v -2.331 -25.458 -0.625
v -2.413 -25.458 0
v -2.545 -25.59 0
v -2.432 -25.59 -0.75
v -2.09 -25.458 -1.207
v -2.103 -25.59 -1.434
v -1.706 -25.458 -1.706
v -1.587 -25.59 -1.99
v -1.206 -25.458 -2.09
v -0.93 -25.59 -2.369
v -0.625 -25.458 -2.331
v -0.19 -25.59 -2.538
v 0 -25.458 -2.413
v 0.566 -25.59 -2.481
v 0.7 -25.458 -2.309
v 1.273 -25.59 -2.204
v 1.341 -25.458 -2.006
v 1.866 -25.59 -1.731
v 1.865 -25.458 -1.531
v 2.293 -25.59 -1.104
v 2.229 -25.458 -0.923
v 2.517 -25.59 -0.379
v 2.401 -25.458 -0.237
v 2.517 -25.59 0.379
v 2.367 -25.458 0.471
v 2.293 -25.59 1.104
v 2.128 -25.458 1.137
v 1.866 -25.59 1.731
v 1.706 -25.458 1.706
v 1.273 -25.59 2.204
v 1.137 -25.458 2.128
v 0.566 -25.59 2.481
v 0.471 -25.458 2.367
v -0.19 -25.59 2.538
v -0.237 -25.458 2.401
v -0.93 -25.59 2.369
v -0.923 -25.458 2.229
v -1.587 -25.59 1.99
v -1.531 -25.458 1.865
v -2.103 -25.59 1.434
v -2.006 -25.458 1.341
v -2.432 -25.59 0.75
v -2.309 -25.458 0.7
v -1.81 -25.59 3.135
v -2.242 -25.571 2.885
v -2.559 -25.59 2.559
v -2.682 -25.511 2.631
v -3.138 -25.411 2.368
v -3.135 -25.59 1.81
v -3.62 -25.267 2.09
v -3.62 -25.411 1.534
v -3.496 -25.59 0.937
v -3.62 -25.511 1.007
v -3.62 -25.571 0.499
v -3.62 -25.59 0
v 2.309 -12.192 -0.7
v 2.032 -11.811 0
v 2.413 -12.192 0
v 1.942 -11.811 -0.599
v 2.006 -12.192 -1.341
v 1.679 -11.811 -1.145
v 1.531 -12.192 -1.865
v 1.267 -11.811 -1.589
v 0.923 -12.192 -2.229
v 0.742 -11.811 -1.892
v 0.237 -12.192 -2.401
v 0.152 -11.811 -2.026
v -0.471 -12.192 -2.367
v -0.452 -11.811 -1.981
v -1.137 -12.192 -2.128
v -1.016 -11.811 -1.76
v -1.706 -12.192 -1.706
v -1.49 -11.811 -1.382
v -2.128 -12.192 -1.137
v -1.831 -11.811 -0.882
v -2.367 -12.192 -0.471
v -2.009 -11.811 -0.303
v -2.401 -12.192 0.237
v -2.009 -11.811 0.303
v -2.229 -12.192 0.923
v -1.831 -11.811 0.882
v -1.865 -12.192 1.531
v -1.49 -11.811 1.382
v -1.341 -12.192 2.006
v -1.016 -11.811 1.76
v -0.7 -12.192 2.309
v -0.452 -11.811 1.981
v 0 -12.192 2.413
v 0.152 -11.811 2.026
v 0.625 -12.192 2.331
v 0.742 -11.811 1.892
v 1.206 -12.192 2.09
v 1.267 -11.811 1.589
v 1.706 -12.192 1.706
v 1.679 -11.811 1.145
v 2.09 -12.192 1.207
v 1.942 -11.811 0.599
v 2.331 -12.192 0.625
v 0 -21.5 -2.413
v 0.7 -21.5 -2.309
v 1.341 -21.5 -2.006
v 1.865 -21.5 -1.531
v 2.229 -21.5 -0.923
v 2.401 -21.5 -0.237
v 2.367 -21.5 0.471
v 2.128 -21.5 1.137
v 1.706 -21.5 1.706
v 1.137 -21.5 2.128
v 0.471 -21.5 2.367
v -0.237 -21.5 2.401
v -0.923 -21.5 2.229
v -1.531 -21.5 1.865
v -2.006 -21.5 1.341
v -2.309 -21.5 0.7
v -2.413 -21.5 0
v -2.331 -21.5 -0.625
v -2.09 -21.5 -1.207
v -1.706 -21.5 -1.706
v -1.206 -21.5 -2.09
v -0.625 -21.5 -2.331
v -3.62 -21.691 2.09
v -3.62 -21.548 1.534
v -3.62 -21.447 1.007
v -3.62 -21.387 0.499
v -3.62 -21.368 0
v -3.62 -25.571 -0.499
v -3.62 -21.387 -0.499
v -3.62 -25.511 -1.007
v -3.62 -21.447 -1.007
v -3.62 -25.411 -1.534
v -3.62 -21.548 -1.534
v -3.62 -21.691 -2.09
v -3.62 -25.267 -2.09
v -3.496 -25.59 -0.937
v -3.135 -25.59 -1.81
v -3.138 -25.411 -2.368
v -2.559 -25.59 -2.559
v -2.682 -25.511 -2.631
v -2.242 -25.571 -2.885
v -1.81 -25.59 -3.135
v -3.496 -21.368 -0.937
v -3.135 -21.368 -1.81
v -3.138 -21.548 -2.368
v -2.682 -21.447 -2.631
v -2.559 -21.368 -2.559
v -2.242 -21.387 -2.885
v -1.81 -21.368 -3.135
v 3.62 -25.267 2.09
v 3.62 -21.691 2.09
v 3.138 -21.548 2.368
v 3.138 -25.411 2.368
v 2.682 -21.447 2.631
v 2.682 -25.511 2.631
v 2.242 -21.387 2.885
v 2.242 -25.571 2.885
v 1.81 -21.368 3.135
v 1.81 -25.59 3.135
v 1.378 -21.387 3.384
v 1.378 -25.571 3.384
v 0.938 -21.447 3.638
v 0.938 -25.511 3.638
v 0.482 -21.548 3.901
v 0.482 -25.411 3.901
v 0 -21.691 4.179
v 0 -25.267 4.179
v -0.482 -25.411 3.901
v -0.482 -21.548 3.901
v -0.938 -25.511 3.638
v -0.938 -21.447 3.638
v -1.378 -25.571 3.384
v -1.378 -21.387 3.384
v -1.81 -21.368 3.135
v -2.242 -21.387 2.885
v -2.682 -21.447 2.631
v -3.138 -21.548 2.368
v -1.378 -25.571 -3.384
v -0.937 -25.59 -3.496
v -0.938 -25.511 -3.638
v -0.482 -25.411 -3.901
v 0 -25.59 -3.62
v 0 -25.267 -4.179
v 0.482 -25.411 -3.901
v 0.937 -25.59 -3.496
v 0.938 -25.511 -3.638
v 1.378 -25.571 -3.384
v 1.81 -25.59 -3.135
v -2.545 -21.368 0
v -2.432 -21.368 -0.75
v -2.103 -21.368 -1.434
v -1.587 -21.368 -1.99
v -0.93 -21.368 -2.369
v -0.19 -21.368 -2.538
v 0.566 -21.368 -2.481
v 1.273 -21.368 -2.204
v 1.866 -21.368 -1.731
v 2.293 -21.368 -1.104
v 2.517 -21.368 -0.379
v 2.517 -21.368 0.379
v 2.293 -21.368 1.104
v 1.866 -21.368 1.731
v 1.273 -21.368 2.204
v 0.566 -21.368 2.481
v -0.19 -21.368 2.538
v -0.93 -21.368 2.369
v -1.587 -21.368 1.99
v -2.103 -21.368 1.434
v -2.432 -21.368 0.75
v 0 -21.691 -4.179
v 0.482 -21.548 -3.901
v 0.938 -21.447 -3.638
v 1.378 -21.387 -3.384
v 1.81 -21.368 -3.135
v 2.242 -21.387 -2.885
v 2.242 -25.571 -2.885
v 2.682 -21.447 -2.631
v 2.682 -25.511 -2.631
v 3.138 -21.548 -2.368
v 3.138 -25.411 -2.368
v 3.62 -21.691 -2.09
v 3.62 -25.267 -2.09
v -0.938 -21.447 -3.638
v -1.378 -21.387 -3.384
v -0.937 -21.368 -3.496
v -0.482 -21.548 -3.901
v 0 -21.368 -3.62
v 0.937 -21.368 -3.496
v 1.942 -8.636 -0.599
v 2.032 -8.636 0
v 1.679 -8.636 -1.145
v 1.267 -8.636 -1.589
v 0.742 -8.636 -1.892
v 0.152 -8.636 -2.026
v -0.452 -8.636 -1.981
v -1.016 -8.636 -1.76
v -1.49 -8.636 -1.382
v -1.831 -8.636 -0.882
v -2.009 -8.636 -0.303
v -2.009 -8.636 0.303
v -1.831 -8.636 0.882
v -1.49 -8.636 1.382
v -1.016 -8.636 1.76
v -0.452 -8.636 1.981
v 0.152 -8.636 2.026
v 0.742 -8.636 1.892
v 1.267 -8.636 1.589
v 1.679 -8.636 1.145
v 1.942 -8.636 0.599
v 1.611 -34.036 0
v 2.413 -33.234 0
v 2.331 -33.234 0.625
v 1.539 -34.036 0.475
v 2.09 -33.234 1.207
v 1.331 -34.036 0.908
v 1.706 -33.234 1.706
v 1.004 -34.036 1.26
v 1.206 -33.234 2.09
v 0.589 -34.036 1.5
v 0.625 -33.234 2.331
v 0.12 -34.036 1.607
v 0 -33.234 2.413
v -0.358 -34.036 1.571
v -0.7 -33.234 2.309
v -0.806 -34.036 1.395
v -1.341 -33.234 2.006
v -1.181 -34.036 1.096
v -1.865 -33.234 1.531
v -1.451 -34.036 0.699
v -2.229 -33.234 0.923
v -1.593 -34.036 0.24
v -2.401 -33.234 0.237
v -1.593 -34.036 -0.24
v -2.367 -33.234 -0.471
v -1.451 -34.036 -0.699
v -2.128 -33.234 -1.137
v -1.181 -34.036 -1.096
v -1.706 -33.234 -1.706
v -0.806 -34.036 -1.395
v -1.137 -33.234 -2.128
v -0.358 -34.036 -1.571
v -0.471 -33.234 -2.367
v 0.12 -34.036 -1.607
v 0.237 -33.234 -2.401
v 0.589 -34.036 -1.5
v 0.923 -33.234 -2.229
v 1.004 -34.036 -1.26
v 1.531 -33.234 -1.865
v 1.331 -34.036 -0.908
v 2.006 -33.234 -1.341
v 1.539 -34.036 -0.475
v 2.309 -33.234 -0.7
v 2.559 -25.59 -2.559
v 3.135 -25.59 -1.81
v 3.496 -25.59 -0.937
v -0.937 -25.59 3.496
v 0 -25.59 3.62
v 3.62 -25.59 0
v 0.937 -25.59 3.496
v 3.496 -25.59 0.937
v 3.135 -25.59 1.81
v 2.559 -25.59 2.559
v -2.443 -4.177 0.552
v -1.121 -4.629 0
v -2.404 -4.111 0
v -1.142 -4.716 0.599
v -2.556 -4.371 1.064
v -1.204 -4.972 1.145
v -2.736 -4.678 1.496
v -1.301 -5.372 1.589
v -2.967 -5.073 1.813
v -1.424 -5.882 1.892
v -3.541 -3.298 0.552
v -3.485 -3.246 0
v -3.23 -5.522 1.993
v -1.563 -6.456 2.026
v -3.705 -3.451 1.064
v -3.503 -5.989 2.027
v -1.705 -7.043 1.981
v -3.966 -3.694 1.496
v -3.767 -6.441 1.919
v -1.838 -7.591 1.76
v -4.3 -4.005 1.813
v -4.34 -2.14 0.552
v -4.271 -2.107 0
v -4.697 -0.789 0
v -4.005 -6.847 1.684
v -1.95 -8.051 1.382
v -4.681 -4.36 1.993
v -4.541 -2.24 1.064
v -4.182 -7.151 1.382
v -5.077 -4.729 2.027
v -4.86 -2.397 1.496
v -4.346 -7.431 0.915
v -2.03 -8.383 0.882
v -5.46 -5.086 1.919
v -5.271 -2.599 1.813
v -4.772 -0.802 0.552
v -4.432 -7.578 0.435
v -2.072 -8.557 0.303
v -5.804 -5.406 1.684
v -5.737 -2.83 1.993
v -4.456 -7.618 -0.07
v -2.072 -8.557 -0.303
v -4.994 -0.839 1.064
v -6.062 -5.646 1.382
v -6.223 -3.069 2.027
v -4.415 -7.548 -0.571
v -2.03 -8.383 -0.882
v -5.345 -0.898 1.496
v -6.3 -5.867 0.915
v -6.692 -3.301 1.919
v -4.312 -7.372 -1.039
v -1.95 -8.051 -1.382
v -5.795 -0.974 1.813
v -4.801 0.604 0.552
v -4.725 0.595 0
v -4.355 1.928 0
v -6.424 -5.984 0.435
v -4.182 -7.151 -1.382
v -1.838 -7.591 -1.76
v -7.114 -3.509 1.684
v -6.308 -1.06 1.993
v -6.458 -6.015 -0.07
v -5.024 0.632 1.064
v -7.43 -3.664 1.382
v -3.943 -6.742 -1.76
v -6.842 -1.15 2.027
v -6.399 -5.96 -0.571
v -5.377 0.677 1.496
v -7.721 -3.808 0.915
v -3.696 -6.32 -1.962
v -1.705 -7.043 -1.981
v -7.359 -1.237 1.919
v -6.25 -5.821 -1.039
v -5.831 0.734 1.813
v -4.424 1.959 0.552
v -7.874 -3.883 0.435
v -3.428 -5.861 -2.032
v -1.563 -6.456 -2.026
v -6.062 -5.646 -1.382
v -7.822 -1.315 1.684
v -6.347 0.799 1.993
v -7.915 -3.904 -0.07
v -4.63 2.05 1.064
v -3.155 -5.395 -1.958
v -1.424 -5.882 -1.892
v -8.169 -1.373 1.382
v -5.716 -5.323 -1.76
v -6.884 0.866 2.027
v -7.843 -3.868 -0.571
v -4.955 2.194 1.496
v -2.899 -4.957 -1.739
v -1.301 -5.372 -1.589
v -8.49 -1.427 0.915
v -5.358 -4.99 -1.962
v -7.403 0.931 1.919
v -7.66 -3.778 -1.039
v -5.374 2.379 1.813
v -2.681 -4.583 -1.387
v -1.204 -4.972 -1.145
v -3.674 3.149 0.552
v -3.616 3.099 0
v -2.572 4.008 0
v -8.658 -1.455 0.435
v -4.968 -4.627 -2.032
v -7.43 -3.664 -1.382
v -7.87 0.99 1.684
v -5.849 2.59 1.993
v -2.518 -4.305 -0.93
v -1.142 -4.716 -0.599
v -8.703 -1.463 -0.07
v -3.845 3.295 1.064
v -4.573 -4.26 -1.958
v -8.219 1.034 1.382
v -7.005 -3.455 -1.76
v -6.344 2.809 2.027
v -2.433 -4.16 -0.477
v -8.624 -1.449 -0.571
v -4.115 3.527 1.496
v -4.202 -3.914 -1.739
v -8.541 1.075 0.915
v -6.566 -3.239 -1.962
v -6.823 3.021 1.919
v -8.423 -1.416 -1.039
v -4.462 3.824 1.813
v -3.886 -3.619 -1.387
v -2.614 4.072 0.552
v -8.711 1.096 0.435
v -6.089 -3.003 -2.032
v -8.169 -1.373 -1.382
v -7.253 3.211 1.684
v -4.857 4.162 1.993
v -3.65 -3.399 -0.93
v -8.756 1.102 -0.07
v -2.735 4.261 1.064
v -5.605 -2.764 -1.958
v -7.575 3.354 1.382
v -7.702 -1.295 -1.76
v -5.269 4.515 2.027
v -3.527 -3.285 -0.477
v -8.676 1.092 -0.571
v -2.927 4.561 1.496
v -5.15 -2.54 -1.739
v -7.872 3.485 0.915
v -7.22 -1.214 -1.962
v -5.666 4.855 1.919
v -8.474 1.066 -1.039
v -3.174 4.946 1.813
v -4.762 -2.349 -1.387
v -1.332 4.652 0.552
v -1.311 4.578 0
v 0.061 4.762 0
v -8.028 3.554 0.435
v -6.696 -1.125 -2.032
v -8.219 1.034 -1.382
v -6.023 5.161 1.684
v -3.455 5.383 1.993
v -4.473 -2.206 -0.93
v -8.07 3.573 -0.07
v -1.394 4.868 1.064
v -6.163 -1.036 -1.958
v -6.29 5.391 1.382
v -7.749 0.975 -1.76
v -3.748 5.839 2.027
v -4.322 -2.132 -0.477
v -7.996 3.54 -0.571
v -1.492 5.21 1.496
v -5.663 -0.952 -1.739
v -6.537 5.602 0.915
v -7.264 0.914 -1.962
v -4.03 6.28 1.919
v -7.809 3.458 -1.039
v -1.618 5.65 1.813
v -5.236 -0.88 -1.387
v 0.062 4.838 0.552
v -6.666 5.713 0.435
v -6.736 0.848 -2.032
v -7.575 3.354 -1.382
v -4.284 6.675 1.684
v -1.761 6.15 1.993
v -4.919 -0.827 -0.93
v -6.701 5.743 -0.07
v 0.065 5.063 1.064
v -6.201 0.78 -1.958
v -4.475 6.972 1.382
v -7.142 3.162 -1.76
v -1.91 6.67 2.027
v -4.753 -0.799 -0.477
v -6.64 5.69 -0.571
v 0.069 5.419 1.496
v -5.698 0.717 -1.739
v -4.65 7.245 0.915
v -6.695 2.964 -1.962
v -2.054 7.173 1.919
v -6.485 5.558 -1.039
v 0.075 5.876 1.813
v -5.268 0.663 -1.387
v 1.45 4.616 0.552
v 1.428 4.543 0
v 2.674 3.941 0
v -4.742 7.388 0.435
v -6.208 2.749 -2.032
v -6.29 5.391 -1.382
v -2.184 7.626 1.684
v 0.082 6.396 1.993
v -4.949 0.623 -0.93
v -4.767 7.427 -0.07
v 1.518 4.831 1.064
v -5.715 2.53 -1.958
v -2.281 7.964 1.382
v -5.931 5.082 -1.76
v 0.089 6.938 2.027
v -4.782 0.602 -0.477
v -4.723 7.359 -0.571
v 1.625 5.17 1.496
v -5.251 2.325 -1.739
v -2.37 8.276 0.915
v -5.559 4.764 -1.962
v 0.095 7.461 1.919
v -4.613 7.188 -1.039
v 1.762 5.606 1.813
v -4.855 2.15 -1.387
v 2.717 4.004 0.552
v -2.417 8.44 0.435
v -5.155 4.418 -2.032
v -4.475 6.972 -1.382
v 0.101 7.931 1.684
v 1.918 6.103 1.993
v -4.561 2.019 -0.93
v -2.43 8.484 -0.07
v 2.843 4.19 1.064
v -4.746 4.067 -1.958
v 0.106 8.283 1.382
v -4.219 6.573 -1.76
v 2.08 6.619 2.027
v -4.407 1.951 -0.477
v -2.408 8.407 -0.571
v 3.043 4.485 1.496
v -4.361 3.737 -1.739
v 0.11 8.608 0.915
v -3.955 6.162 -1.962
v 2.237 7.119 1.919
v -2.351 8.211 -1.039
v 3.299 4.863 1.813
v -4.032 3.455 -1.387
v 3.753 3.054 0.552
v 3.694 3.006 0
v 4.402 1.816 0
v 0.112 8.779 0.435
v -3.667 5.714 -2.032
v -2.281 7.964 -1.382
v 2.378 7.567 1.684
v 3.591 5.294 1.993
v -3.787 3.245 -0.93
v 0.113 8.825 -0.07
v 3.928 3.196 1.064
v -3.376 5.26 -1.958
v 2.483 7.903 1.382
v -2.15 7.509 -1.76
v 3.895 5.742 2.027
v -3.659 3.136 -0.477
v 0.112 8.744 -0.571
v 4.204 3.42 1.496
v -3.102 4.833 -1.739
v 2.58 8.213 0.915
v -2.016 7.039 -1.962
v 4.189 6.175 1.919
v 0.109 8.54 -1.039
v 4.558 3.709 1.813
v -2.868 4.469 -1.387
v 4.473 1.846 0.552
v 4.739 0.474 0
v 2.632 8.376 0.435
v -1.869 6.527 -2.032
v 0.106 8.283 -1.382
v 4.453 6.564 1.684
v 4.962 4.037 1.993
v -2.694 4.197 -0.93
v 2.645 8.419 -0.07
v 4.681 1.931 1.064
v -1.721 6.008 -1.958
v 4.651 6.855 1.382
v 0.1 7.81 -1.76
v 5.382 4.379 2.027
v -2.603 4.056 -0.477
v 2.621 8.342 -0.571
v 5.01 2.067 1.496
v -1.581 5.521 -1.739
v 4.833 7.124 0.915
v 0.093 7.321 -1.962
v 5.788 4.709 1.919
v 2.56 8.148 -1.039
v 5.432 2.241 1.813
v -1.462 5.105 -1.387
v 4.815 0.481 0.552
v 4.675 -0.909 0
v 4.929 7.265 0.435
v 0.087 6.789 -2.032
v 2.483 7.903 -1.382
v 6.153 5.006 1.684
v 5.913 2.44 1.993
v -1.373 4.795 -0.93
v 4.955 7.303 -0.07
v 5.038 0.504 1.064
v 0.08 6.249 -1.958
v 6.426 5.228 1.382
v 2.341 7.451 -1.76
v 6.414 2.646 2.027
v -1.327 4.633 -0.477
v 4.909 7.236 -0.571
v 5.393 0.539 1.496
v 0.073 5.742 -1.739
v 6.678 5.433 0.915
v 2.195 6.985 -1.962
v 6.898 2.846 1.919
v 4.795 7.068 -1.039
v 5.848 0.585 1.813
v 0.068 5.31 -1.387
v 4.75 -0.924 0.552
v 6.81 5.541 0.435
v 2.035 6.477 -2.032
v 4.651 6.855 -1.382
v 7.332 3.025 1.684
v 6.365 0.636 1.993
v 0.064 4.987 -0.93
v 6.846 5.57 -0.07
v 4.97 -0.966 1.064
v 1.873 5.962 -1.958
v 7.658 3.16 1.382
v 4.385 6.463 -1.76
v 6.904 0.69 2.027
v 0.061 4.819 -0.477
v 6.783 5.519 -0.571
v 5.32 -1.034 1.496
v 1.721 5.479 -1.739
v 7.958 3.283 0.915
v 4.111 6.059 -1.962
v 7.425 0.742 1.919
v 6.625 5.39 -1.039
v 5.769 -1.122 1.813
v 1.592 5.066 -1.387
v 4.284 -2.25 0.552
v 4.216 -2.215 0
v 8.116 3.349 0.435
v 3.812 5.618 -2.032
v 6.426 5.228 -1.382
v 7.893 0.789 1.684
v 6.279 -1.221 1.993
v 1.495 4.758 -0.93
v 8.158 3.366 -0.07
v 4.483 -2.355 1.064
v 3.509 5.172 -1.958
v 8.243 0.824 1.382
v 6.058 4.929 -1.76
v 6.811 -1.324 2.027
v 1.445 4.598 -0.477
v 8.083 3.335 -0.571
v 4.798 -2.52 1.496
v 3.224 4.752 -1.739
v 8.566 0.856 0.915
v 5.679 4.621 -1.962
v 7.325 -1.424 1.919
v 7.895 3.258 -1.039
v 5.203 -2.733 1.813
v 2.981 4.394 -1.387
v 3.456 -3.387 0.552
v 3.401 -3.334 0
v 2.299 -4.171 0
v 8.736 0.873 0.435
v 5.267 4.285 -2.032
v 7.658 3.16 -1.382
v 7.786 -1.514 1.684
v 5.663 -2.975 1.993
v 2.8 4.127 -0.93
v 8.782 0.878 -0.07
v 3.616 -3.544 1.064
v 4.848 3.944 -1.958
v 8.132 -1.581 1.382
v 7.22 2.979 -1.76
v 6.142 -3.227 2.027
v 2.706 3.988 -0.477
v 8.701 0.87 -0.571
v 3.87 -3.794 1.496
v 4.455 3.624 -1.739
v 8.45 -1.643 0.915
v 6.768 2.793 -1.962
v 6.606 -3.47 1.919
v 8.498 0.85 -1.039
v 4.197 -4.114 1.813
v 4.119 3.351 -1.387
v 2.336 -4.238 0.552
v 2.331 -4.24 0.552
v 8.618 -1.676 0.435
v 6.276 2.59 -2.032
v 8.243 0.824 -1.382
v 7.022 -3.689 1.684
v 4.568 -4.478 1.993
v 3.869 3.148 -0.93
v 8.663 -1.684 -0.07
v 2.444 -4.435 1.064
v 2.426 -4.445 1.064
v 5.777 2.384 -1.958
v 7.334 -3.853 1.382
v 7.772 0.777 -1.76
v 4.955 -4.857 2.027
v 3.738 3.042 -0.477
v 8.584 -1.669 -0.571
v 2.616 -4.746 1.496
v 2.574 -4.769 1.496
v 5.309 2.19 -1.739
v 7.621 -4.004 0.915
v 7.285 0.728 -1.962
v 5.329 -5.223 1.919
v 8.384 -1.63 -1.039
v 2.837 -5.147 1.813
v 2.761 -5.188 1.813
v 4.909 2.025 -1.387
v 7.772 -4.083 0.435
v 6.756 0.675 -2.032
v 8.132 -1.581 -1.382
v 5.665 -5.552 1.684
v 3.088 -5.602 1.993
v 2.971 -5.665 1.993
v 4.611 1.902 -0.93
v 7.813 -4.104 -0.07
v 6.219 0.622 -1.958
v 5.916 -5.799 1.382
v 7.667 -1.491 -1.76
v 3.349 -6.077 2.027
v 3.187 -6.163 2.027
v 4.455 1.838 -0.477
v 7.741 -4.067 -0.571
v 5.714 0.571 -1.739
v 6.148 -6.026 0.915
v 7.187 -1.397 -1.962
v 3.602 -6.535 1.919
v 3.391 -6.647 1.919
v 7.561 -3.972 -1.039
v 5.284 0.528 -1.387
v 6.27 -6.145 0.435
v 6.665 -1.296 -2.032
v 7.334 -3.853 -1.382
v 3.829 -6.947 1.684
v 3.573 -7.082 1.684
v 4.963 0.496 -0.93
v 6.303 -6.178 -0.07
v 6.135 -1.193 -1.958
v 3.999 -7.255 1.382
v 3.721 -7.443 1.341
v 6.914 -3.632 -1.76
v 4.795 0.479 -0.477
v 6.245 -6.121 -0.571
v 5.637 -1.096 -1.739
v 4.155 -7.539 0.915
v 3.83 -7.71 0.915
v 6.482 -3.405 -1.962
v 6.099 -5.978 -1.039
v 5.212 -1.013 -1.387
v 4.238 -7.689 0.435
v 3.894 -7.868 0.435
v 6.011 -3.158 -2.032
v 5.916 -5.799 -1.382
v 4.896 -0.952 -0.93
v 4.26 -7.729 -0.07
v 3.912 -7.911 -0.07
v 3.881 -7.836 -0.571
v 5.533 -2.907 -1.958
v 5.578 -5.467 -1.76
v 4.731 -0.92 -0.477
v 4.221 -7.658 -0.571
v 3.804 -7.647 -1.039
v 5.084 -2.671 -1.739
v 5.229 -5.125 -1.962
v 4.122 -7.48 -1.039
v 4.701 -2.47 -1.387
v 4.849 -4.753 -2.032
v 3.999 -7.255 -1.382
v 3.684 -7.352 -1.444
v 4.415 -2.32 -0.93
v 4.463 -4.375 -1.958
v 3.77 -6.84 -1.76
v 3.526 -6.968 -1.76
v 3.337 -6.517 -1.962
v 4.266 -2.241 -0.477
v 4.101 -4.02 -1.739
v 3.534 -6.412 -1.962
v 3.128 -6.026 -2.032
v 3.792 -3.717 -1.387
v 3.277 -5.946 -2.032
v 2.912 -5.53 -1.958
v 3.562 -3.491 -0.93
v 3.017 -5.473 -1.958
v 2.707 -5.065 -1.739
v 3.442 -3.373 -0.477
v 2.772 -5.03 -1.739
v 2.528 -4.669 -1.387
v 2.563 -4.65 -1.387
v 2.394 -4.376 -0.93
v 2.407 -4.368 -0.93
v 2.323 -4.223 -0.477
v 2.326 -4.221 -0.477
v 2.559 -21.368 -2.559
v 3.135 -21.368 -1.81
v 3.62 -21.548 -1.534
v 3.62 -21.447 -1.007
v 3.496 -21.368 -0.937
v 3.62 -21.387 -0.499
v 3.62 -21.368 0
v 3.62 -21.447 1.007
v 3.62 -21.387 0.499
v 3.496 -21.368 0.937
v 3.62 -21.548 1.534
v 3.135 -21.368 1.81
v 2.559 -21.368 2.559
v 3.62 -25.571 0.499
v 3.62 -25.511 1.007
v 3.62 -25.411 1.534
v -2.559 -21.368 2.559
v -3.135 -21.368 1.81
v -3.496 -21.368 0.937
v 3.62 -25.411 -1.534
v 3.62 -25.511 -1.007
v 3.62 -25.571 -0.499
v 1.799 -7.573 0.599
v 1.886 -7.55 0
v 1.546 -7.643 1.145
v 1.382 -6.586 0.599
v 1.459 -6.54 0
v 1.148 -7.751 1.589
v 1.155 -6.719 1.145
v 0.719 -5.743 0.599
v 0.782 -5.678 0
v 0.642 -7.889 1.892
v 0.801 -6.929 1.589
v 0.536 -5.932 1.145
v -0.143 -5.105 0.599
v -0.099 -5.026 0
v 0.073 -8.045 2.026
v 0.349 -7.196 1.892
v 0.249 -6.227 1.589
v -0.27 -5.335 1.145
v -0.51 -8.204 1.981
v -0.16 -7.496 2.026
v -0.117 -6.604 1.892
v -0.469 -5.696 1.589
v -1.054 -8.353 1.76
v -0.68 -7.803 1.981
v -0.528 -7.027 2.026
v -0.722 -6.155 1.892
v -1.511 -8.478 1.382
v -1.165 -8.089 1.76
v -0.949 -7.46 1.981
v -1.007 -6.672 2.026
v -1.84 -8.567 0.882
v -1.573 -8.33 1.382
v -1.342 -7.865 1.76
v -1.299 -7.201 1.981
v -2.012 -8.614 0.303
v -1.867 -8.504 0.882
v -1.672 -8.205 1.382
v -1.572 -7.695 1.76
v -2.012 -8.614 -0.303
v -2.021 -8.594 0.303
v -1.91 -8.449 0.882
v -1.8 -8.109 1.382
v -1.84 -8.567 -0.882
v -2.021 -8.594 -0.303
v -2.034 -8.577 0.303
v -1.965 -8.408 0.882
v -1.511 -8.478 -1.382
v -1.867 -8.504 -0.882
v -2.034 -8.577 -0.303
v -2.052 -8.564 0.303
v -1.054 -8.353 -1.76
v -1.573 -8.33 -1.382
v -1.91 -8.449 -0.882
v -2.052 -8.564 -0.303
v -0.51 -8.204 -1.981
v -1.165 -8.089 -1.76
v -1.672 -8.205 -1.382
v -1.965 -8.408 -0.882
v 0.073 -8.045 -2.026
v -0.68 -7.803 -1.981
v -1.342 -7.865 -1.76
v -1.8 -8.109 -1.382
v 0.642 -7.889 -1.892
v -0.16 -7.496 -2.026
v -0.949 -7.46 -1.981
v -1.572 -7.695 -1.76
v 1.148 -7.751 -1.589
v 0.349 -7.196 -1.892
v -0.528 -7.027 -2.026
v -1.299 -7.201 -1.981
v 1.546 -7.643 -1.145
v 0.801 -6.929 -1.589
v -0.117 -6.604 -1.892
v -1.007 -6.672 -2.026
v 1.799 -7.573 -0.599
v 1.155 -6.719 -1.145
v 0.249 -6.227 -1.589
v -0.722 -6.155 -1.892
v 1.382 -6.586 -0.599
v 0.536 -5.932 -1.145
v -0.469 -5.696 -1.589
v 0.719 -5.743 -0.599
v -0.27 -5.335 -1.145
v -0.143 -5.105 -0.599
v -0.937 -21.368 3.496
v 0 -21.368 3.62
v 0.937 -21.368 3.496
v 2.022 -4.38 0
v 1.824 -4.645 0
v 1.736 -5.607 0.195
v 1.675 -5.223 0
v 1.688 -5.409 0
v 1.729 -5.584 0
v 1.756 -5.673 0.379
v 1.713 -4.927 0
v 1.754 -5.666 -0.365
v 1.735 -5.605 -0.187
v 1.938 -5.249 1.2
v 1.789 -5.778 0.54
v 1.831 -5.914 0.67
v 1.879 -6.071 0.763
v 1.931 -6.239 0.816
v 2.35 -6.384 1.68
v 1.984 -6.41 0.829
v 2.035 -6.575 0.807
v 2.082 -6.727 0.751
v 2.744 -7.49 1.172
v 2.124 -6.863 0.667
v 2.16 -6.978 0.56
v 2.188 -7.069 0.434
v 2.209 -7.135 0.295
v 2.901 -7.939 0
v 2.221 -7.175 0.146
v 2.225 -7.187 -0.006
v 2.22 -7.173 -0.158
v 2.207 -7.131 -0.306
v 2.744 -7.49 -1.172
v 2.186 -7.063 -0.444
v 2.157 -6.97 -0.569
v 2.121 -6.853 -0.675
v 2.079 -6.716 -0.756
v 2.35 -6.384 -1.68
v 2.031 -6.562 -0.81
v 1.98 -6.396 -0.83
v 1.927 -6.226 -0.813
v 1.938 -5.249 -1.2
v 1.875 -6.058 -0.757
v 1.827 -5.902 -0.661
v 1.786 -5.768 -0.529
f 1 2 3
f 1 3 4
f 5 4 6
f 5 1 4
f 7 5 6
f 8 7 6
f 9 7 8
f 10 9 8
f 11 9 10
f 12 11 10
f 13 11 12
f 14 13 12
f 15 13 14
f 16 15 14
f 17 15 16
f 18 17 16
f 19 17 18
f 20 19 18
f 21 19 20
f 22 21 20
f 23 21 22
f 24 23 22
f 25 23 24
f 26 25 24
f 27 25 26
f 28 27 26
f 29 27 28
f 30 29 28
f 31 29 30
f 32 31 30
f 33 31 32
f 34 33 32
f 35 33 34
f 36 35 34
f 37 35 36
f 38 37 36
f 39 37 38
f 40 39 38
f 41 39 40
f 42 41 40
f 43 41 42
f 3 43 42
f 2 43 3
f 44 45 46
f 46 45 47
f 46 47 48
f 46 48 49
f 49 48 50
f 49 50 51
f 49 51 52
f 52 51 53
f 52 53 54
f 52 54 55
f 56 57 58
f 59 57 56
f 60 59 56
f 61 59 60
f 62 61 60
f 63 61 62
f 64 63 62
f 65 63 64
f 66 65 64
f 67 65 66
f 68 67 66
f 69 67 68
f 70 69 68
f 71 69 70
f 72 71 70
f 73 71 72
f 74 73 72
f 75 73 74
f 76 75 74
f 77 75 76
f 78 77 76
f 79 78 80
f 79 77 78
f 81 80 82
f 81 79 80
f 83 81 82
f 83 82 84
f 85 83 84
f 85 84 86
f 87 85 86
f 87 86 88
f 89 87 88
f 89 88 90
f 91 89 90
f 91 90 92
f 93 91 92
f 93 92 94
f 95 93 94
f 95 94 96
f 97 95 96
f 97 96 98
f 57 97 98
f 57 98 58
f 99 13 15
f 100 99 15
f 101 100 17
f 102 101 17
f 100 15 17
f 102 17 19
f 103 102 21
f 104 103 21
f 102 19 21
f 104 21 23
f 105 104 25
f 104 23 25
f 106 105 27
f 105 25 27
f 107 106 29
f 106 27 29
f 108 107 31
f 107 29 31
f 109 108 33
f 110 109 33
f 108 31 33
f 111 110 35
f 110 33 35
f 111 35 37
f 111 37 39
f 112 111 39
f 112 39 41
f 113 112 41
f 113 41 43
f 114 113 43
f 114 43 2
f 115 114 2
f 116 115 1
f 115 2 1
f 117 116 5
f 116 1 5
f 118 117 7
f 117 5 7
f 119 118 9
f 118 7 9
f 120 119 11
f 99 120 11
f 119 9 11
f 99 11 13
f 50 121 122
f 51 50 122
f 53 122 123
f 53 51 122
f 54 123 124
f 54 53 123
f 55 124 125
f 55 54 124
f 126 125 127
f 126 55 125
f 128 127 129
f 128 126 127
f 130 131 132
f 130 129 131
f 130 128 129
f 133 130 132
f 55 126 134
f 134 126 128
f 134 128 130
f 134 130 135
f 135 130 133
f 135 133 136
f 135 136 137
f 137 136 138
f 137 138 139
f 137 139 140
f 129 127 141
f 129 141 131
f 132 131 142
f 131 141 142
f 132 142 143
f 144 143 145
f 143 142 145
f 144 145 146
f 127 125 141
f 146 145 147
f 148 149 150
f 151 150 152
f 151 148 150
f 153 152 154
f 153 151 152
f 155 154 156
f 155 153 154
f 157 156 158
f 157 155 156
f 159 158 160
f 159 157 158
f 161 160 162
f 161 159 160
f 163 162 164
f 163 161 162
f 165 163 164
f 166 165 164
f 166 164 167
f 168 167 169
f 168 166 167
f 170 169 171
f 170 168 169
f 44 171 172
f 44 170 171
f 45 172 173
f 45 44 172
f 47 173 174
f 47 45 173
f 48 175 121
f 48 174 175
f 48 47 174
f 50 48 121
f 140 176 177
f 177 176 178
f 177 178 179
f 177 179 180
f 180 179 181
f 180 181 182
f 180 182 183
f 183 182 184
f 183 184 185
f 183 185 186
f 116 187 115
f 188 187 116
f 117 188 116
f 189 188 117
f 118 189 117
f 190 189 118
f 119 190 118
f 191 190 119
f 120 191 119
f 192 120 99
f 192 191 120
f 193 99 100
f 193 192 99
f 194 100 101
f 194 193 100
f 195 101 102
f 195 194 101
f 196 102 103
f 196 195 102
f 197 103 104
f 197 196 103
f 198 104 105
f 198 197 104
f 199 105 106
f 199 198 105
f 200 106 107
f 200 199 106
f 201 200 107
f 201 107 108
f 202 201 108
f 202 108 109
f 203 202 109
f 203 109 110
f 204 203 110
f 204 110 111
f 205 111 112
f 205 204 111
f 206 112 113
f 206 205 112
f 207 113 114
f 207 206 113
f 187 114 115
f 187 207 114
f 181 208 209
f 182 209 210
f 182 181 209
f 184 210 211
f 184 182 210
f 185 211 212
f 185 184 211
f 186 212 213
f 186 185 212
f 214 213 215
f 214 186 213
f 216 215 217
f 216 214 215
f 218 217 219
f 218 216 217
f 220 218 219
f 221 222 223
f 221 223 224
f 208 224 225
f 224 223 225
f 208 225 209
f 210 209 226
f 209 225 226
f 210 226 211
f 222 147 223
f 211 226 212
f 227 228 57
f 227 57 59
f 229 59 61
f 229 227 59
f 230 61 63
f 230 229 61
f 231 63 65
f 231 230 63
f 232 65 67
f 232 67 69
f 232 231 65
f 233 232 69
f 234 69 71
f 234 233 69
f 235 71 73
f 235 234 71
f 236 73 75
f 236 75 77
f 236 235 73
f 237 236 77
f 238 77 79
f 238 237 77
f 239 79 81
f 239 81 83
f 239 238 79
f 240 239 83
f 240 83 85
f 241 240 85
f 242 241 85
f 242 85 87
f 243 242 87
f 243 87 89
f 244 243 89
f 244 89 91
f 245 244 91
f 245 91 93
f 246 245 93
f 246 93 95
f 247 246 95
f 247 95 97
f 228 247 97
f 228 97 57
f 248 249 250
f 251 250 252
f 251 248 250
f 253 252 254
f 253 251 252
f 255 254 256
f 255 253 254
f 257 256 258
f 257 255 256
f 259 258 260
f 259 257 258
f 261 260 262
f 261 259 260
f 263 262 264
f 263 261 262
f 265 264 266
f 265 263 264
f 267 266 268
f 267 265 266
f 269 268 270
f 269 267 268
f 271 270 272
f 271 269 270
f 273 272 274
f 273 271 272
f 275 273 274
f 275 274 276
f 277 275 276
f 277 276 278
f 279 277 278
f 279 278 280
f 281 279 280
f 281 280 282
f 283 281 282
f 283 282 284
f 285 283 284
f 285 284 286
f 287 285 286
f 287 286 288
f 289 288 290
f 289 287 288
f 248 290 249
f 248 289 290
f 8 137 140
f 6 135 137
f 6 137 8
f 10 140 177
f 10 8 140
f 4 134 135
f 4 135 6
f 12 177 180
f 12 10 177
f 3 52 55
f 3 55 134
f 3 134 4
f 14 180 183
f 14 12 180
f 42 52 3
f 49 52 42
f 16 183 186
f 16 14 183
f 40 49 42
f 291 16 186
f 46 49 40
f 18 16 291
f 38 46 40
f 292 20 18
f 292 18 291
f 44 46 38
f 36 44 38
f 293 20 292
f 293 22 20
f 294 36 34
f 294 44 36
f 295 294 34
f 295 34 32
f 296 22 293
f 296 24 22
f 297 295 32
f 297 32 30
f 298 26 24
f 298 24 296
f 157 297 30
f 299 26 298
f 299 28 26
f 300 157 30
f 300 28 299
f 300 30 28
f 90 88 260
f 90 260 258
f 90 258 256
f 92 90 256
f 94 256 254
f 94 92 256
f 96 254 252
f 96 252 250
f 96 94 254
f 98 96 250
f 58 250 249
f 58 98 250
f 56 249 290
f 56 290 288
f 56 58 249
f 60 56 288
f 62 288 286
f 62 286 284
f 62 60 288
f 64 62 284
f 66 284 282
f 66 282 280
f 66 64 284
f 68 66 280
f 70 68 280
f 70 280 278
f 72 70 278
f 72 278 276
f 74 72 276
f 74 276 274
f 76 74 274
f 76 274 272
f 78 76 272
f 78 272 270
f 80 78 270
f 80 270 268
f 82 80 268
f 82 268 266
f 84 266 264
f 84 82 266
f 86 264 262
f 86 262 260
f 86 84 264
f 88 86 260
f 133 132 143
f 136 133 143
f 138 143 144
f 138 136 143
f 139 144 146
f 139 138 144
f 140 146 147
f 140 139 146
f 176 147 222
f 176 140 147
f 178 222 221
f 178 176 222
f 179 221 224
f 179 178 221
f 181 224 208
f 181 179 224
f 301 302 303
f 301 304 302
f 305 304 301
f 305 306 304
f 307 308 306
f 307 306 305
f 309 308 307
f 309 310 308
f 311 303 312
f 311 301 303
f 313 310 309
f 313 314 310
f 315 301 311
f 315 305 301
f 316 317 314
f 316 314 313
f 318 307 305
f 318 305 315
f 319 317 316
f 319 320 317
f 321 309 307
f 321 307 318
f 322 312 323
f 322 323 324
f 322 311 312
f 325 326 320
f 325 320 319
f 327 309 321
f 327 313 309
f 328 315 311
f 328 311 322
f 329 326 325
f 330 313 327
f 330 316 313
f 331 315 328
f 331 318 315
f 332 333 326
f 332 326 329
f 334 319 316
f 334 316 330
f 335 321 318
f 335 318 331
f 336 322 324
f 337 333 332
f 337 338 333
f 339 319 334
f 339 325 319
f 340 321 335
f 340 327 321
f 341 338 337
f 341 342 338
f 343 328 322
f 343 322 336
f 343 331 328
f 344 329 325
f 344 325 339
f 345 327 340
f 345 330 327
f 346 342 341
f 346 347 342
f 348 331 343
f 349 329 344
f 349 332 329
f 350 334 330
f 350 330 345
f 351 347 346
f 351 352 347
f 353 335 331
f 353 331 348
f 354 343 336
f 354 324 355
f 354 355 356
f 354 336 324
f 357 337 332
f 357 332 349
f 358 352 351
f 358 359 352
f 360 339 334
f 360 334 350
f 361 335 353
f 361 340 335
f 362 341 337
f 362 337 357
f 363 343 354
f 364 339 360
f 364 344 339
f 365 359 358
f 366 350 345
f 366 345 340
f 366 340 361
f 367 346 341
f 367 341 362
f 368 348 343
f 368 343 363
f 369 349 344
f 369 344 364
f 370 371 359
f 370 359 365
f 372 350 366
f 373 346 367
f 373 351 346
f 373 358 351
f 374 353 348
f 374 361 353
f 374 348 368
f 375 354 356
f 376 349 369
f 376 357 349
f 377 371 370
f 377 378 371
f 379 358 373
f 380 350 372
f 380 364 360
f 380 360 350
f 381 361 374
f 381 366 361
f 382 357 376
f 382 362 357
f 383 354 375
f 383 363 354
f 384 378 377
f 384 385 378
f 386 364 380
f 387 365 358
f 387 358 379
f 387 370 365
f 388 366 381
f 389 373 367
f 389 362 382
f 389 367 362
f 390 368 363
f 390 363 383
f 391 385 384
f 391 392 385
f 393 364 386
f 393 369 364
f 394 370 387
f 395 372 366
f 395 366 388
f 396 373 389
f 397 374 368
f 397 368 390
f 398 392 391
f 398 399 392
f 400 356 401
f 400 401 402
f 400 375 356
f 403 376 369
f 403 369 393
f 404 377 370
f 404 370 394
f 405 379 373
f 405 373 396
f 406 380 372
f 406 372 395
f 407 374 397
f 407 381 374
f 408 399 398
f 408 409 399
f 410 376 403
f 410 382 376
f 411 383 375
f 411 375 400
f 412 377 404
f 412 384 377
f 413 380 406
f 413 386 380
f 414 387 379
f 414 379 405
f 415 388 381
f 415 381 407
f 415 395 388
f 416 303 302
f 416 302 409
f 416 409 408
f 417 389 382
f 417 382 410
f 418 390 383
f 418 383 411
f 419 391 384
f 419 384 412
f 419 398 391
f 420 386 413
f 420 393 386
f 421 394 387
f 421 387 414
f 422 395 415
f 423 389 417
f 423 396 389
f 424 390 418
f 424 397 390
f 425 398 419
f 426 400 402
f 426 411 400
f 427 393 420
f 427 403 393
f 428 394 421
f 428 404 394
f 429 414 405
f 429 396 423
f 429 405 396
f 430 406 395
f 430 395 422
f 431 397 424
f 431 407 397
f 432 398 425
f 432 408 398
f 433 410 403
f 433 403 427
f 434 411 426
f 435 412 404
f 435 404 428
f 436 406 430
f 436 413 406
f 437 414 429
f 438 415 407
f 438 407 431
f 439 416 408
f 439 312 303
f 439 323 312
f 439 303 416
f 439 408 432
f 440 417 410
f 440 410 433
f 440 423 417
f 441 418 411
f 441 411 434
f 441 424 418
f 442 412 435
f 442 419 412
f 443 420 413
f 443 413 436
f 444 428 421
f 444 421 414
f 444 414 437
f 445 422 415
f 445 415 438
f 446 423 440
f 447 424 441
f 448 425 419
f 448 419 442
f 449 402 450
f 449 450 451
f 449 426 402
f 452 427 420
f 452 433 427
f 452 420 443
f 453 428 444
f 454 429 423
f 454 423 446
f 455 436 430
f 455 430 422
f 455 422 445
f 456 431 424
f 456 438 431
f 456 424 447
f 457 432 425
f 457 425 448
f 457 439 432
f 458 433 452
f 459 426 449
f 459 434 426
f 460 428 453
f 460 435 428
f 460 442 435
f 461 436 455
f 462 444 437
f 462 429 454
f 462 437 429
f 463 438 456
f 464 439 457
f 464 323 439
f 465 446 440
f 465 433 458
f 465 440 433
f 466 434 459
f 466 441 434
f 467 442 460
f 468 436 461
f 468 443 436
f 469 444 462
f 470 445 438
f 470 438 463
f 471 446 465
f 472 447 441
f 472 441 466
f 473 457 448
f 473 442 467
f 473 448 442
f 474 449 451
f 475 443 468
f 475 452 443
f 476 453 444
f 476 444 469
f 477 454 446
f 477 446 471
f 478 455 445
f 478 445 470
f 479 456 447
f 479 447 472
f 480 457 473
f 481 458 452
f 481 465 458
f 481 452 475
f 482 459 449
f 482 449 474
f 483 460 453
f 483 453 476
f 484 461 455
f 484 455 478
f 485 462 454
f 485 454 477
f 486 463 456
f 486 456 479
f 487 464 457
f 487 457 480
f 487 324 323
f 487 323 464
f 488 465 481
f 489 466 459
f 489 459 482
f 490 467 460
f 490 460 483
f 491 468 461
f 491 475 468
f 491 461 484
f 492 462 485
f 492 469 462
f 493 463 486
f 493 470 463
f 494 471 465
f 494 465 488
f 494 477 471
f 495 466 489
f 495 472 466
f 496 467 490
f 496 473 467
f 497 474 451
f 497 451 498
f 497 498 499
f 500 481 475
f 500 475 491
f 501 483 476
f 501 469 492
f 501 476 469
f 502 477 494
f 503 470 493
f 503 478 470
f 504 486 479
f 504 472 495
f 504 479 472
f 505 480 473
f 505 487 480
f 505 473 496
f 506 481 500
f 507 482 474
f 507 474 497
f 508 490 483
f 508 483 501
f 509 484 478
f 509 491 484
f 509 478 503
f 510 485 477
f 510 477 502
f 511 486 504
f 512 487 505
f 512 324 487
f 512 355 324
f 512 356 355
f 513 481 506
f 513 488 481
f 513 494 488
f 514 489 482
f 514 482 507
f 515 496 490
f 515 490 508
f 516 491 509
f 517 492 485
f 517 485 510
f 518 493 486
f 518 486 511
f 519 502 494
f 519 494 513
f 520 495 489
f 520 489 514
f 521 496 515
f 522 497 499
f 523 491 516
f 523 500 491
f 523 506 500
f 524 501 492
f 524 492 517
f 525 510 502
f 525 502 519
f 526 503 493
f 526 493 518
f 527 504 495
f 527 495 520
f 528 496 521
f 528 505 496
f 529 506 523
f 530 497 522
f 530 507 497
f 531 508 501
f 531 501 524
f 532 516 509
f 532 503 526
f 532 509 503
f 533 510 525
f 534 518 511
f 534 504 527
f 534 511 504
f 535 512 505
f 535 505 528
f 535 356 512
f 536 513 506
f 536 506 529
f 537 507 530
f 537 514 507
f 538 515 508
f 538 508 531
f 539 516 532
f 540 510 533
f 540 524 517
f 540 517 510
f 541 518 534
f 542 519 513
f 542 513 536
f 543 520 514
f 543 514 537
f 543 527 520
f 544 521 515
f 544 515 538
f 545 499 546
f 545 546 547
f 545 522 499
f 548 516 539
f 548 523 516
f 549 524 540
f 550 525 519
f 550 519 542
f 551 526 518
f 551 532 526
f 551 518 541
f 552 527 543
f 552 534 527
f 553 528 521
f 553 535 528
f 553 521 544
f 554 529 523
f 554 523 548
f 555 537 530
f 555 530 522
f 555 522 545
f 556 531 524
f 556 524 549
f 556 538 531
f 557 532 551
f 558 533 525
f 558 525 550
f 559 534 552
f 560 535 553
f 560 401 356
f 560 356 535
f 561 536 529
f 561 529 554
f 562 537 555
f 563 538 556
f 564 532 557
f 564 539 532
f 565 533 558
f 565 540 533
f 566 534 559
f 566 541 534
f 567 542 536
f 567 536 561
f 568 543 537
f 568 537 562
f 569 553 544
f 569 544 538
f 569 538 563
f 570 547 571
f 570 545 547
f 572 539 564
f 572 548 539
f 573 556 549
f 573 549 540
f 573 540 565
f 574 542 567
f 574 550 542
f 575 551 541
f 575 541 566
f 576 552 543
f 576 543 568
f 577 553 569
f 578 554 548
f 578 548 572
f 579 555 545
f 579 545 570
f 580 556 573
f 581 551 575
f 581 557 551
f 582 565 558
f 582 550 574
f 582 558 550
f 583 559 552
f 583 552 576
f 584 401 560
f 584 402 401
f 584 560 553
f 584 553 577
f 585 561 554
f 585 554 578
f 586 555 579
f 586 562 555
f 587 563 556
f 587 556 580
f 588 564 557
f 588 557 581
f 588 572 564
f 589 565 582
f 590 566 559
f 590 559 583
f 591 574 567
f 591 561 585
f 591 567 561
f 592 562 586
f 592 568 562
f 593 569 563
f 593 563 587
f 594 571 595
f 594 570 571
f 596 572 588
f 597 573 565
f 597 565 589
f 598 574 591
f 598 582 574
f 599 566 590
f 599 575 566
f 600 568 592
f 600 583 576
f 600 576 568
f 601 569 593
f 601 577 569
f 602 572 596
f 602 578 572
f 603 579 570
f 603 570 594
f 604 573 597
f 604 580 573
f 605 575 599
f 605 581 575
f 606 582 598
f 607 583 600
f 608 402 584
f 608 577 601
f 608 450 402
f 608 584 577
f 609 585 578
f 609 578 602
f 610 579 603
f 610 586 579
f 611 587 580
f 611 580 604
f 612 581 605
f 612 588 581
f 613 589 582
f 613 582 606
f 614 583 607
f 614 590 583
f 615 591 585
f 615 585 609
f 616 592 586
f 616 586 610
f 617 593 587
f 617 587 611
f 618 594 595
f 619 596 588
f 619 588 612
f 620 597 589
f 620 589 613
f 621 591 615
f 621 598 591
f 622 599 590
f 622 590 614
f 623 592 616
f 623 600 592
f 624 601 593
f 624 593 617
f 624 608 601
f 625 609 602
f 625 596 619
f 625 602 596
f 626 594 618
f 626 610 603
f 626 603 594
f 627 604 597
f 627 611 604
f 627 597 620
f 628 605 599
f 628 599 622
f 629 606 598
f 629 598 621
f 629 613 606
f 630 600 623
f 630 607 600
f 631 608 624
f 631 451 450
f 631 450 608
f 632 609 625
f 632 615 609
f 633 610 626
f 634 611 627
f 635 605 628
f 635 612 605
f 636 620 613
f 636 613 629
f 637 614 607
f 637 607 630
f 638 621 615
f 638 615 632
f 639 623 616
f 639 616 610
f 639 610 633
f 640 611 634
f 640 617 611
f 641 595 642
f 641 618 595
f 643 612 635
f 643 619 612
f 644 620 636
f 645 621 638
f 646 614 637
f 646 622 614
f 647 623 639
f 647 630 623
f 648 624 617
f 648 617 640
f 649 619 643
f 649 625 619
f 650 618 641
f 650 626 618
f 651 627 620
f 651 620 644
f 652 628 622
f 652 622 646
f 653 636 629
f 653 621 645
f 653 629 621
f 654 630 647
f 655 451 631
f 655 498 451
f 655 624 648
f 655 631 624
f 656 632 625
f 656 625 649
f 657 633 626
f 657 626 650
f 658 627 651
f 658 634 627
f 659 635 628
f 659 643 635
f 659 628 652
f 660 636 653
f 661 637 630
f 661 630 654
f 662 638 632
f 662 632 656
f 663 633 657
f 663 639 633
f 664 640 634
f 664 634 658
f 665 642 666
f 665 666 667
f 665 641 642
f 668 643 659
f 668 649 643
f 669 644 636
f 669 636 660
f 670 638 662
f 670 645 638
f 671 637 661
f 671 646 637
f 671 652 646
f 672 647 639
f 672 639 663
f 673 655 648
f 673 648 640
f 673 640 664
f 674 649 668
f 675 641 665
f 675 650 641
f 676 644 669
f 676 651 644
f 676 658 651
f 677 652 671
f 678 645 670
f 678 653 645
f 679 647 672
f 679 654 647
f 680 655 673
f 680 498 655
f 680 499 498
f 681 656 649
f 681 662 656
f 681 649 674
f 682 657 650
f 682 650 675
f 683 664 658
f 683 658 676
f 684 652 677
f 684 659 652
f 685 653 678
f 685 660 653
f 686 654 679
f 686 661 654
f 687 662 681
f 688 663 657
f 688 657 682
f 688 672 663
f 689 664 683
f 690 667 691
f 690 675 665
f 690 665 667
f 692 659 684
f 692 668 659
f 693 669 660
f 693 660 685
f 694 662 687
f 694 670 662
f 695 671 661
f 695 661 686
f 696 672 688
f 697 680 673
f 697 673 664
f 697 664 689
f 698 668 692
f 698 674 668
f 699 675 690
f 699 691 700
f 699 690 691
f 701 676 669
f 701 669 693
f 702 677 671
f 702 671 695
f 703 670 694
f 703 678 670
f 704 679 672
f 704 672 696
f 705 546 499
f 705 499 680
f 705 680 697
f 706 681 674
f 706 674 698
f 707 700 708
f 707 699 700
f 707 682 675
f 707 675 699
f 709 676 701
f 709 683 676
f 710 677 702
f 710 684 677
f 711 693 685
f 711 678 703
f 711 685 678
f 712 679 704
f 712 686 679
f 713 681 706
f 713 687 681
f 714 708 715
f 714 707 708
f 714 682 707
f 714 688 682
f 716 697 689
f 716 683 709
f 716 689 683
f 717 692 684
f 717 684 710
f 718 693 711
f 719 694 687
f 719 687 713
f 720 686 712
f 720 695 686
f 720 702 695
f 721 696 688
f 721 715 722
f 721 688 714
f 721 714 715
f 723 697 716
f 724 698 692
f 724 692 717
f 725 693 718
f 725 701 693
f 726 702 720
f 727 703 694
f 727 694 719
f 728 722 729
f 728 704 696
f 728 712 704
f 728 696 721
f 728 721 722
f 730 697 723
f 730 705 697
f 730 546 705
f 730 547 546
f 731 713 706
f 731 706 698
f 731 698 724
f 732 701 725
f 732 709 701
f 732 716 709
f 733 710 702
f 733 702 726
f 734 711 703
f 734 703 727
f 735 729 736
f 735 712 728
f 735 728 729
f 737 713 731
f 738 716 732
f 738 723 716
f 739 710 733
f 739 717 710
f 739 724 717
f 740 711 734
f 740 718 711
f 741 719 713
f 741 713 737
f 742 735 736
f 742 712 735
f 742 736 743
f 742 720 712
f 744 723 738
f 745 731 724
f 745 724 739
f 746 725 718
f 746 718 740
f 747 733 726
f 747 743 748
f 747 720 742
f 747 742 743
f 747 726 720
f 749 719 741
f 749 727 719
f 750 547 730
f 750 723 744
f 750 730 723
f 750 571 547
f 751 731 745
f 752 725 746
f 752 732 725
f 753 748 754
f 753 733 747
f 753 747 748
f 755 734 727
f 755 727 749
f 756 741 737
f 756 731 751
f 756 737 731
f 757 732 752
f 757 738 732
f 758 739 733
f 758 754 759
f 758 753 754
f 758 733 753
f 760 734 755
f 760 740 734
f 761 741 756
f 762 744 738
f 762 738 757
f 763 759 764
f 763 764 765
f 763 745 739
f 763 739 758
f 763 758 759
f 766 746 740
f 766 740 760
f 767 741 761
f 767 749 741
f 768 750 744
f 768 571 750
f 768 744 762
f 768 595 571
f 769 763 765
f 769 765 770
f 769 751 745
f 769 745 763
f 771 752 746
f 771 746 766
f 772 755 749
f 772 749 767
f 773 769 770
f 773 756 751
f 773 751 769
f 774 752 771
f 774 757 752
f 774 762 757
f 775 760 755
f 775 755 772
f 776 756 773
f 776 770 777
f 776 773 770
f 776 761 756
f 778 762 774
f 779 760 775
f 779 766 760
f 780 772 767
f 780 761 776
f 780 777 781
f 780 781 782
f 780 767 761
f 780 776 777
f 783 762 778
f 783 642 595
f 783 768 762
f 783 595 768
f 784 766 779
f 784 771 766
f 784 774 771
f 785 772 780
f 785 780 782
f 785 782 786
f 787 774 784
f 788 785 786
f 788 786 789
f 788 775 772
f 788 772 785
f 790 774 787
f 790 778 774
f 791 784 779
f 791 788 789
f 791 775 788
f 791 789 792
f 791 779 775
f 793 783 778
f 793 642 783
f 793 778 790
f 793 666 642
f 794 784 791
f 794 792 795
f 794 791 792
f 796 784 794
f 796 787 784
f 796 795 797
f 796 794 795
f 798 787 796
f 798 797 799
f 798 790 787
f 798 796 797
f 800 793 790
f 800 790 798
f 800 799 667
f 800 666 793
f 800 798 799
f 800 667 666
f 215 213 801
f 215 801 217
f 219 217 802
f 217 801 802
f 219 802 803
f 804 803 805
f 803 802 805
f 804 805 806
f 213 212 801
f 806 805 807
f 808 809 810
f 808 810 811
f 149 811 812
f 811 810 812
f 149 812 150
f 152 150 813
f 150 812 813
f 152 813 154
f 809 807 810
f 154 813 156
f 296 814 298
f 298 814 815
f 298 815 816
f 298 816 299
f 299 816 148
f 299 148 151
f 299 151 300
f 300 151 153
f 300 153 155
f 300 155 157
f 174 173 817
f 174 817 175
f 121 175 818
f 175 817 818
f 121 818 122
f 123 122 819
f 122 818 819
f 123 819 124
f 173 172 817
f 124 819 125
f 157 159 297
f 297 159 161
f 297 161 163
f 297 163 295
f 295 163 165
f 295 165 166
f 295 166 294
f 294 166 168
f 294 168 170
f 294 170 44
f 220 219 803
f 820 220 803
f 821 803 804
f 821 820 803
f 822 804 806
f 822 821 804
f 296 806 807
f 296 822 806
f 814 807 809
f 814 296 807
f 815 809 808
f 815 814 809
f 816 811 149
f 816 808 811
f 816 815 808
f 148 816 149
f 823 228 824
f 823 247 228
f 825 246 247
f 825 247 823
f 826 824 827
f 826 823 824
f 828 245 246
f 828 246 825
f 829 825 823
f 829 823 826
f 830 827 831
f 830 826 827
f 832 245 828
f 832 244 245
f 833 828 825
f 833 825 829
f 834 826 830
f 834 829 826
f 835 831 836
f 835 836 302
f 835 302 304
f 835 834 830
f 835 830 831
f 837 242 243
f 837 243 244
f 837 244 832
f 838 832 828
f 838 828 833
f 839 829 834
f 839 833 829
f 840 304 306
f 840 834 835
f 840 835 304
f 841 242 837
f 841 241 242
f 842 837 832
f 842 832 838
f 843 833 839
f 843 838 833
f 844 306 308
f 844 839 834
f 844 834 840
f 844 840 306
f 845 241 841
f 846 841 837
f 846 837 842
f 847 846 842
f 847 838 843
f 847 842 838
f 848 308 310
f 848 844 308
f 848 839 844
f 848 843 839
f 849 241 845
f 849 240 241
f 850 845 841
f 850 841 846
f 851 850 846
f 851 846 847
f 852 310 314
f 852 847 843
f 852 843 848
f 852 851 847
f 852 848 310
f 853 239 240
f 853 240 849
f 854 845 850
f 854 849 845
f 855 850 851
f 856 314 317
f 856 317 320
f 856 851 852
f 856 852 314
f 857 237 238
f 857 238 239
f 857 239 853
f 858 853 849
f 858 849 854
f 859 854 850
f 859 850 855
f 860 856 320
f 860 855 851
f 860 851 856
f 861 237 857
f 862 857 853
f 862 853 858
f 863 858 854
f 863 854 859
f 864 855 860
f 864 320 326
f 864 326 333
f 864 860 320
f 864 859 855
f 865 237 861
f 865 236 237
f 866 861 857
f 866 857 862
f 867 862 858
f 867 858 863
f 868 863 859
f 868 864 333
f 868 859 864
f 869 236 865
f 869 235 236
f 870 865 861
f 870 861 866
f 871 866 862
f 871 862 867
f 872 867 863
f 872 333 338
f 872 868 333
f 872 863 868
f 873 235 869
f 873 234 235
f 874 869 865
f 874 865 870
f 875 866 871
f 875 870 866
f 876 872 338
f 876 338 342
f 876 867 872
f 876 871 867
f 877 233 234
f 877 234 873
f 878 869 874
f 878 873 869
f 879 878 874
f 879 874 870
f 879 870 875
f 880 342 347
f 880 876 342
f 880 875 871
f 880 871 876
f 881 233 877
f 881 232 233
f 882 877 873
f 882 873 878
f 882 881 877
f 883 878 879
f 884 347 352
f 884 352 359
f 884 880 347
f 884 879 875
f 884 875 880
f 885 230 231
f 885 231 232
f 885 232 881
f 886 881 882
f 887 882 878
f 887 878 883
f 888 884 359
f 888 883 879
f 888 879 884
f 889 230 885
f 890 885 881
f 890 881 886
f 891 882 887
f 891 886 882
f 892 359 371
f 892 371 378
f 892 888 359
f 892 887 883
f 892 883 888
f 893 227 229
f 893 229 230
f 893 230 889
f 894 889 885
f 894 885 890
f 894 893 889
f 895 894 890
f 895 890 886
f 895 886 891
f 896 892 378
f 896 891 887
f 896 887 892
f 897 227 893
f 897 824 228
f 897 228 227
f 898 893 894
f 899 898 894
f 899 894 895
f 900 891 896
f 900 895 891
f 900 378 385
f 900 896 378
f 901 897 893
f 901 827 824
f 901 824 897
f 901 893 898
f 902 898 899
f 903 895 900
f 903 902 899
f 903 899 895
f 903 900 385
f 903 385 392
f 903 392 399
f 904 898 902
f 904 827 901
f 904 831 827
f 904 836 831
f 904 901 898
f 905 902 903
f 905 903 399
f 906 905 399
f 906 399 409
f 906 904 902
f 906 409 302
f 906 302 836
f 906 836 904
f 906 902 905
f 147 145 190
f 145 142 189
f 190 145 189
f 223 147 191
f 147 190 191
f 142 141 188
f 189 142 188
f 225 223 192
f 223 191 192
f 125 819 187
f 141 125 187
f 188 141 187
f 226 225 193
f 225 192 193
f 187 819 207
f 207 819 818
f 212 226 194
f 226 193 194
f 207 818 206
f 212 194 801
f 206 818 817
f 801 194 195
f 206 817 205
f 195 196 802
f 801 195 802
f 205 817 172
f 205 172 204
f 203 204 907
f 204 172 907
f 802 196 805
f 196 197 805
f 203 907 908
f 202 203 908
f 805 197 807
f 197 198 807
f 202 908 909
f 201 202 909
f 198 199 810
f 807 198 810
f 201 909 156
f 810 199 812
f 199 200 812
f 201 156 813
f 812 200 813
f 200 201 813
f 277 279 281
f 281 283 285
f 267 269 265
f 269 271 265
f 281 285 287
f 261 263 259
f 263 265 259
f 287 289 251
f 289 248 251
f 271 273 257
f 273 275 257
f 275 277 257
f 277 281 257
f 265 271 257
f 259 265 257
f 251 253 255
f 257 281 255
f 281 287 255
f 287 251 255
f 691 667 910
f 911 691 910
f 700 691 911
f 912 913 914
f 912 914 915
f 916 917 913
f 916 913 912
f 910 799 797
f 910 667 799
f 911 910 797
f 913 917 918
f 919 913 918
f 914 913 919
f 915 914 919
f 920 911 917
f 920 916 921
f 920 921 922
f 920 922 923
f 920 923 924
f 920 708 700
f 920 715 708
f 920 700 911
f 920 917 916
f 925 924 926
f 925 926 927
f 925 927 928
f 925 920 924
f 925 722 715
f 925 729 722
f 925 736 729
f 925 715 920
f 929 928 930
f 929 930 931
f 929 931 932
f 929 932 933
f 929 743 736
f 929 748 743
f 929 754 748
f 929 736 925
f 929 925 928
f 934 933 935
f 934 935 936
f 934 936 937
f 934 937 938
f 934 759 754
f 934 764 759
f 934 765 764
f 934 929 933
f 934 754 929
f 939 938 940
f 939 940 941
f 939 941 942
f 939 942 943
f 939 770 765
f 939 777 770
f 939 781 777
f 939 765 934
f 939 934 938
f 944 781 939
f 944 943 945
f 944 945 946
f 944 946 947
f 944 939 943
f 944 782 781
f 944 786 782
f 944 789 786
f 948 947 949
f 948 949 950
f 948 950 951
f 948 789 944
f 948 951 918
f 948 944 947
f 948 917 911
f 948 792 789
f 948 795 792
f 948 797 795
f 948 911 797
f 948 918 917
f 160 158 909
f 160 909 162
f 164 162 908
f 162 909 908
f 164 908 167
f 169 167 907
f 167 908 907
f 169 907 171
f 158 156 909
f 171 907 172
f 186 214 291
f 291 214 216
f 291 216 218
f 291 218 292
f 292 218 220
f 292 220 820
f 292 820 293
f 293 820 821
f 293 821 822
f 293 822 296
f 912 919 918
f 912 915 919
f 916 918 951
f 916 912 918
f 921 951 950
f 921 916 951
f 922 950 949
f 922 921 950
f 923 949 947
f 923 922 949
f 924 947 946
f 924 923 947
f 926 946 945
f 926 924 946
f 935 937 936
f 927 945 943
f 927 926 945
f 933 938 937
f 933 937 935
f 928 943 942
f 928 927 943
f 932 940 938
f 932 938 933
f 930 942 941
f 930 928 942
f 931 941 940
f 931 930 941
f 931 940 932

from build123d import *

# Parameters (mm, degrees)
BOSS_EXTRUDE1_START = -11.811
SKETCH2_R           = 2.413
BOSS_EXTRUDE1_DEPTH = 22.225
SKETCH5_OUTSIDE_W   = 55.926
SKETCH5_OUTSIDE_H   = 55.926
SKETCH5_OUTSIDE_R   = 1.611024392
CUT_EXTRUDE1_DEPTH  = 22.225
CUT_EXTRUDE1_DRAFT  = -45
SKETCH6_OUTSIDE_W   = 55.926
SKETCH6_OUTSIDE_H   = 55.926
SKETCH6_OUTSIDE_R   = 2.032
CUT_EXTRUDE2_DEPTH  = 22.225
CUT_EXTRUDE2_DRAFT  = -45
SKETCH7_R           = 2.032
FILLET1_R           = 1.2065
BOSS_EXTRUDE2_START = -8.4455
SKETCH9_R           = 2.413
BOSS_EXTRUDE2_DEPTH = 4.22275


with BuildPart() as part:
    # Sketch2 → Boss-Extrude1 (new body)
    with BuildSketch(Plane(origin=(0, 0, 0), x_dir=(1, 0, 0), z_dir=(0, 1, 0)).offset(BOSS_EXTRUDE1_START)):
        with Locations(Location((0, 0, 0), (0, 0, 270))):
            Circle(SKETCH2_R)
    extrude(amount=-BOSS_EXTRUDE1_DEPTH)


with BuildPart() as cut_extrude1_tool:
    # Sketch5 outside → Cut-Extrude1 (with draft: the straight prism first)
    with BuildSketch(Plane.XZ.offset(34.036)):
        Rectangle(SKETCH5_OUTSIDE_W, SKETCH5_OUTSIDE_H)
        Circle(SKETCH5_OUTSIDE_R, mode=Mode.SUBTRACT)
    extrude(amount=-CUT_EXTRUDE1_DEPTH)
    # Cut-Extrude1: the draft: its side faces are tilted about the plane it starts from
    cut_extrude1_sides = [cut_extrude1_tool.faces().sort_by_distance(p)[0] for p in [
        (0, -22.9235, -27.963),
        (27.963, -22.9235, 0),
        (0, -22.9235, 27.963),
        (-27.963, -22.9235, 0),
        (-1.611024392, -22.9235, 0),
    ]]
    draft(cut_extrude1_sides, Plane.XZ.offset(34.036), CUT_EXTRUDE1_DRAFT)


with BuildPart() as part_1:
    add(part.part)

    # Cut-Extrude1: cut by cut_extrude1_tool
    add(cut_extrude1_tool.part, mode=Mode.SUBTRACT)


with BuildPart() as cut_extrude2_tool:
    # Sketch6 outside → Cut-Extrude2 (with draft: the straight prism first)
    with BuildSketch(Plane(origin=(0, -11.811, 0), x_dir=(1, 0, 0), z_dir=(0, 1, 0))):
        Rectangle(SKETCH6_OUTSIDE_W, SKETCH6_OUTSIDE_H)
        Circle(SKETCH6_OUTSIDE_R, mode=Mode.SUBTRACT)
    extrude(amount=-CUT_EXTRUDE2_DEPTH)
    # Cut-Extrude2: the draft: its side faces are tilted about the plane it starts from
    cut_extrude2_sides = [cut_extrude2_tool.faces().sort_by_distance(p)[0] for p in [
        (0, -22.9235, 27.963),
        (27.963, -22.9235, 0),
        (0, -22.9235, -27.963),
        (-27.963, -22.9235, 0),
        (-2.032, -22.9235, 0),
    ]]
    draft(cut_extrude2_sides, Plane(origin=(0, -11.811, 0), x_dir=(1, 0, 0), z_dir=(0, 1, 0)), CUT_EXTRUDE2_DRAFT)


with BuildPart() as part_2:
    add(part_1.part)

    # Cut-Extrude2: cut by cut_extrude2_tool
    add(cut_extrude2_tool.part, mode=Mode.SUBTRACT)

    # Sweep1: sweep along a path in Sketch8
    with BuildLine(Plane.XY) as sweep1_path:
        Line((0, -11.811), (0, -8.636))
        ThreePointArc((0, -8.636), (-0.447657805, -7.343037758), (-1.598959476, -6.603677676))
        ThreePointArc((-1.598959476, -6.603677676), (-0.212740878, 6.791168645), (2.009153775, -6.490649533))
    # Sketch7 → Sweep1 (sweep)
    with BuildSketch(Plane(origin=(0, -11.811, 0), x_dir=(1, 0, 0), z_dir=(0, 1, 0))):
        Circle(SKETCH7_R)
    sweep(path=sweep1_path.line)

    # Fillet1
    fillet1_edges = [part_2.edges().sort_by_distance(p)[0] for p in [
        (2.610022194, -8.431778365, 0),
    ]]
    fillet(fillet1_edges, radius=FILLET1_R)


with BuildPart() as body_2:
    # Sketch9 → Boss-Extrude2 (new body)
    with BuildSketch(Plane.XZ.offset(34.036).offset(BOSS_EXTRUDE2_START)):
        Polygon((0, 4.179438599), (-3.6195, 2.089719299), (-3.6195, -2.089719299), (0, -4.179438599), (3.6195, -2.089719299), (3.6195, 2.089719299), align=None)
        with Locations(Location((0, 0, 0), (0, 0, 270))):
            Circle(SKETCH9_R, mode=Mode.SUBTRACT)
    extrude(amount=-BOSS_EXTRUDE2_DEPTH)

    # Sketch10 → Cut-Revolve1 (revolve, cut)
    with BuildSketch(Plane(origin=(0, 0, 0), x_dir=(0, 0, -1), z_dir=(1, 0, 0)), mode=Mode.PRIVATE) as cut_revolve1_sk:
        Polygon((-3.6195, -21.36775), (-4.739377197, -21.36775), (-4.739377197, -25.5905), (-3.6195, -25.5905), (-4.179438599, -25.267219299), (-4.179438599, -21.691030701), align=None)
        Polygon((-2.280708333, -21.36775), (-2.280708333, -25.5905), (-2.545291667, -25.5905), (-2.413, -25.458208333), (-2.413, -21.500041667), (-2.545291667, -21.36775), align=None)
    revolve(cut_revolve1_sk.sketch.rotate(Axis((0, -8.636, 0), (0, -1, 0)), 90), axis=Axis((0, -8.636, 0), (0, -1, 0)), mode=Mode.SUBTRACT)


solid = Compound([part_2.part, body_2.part])
